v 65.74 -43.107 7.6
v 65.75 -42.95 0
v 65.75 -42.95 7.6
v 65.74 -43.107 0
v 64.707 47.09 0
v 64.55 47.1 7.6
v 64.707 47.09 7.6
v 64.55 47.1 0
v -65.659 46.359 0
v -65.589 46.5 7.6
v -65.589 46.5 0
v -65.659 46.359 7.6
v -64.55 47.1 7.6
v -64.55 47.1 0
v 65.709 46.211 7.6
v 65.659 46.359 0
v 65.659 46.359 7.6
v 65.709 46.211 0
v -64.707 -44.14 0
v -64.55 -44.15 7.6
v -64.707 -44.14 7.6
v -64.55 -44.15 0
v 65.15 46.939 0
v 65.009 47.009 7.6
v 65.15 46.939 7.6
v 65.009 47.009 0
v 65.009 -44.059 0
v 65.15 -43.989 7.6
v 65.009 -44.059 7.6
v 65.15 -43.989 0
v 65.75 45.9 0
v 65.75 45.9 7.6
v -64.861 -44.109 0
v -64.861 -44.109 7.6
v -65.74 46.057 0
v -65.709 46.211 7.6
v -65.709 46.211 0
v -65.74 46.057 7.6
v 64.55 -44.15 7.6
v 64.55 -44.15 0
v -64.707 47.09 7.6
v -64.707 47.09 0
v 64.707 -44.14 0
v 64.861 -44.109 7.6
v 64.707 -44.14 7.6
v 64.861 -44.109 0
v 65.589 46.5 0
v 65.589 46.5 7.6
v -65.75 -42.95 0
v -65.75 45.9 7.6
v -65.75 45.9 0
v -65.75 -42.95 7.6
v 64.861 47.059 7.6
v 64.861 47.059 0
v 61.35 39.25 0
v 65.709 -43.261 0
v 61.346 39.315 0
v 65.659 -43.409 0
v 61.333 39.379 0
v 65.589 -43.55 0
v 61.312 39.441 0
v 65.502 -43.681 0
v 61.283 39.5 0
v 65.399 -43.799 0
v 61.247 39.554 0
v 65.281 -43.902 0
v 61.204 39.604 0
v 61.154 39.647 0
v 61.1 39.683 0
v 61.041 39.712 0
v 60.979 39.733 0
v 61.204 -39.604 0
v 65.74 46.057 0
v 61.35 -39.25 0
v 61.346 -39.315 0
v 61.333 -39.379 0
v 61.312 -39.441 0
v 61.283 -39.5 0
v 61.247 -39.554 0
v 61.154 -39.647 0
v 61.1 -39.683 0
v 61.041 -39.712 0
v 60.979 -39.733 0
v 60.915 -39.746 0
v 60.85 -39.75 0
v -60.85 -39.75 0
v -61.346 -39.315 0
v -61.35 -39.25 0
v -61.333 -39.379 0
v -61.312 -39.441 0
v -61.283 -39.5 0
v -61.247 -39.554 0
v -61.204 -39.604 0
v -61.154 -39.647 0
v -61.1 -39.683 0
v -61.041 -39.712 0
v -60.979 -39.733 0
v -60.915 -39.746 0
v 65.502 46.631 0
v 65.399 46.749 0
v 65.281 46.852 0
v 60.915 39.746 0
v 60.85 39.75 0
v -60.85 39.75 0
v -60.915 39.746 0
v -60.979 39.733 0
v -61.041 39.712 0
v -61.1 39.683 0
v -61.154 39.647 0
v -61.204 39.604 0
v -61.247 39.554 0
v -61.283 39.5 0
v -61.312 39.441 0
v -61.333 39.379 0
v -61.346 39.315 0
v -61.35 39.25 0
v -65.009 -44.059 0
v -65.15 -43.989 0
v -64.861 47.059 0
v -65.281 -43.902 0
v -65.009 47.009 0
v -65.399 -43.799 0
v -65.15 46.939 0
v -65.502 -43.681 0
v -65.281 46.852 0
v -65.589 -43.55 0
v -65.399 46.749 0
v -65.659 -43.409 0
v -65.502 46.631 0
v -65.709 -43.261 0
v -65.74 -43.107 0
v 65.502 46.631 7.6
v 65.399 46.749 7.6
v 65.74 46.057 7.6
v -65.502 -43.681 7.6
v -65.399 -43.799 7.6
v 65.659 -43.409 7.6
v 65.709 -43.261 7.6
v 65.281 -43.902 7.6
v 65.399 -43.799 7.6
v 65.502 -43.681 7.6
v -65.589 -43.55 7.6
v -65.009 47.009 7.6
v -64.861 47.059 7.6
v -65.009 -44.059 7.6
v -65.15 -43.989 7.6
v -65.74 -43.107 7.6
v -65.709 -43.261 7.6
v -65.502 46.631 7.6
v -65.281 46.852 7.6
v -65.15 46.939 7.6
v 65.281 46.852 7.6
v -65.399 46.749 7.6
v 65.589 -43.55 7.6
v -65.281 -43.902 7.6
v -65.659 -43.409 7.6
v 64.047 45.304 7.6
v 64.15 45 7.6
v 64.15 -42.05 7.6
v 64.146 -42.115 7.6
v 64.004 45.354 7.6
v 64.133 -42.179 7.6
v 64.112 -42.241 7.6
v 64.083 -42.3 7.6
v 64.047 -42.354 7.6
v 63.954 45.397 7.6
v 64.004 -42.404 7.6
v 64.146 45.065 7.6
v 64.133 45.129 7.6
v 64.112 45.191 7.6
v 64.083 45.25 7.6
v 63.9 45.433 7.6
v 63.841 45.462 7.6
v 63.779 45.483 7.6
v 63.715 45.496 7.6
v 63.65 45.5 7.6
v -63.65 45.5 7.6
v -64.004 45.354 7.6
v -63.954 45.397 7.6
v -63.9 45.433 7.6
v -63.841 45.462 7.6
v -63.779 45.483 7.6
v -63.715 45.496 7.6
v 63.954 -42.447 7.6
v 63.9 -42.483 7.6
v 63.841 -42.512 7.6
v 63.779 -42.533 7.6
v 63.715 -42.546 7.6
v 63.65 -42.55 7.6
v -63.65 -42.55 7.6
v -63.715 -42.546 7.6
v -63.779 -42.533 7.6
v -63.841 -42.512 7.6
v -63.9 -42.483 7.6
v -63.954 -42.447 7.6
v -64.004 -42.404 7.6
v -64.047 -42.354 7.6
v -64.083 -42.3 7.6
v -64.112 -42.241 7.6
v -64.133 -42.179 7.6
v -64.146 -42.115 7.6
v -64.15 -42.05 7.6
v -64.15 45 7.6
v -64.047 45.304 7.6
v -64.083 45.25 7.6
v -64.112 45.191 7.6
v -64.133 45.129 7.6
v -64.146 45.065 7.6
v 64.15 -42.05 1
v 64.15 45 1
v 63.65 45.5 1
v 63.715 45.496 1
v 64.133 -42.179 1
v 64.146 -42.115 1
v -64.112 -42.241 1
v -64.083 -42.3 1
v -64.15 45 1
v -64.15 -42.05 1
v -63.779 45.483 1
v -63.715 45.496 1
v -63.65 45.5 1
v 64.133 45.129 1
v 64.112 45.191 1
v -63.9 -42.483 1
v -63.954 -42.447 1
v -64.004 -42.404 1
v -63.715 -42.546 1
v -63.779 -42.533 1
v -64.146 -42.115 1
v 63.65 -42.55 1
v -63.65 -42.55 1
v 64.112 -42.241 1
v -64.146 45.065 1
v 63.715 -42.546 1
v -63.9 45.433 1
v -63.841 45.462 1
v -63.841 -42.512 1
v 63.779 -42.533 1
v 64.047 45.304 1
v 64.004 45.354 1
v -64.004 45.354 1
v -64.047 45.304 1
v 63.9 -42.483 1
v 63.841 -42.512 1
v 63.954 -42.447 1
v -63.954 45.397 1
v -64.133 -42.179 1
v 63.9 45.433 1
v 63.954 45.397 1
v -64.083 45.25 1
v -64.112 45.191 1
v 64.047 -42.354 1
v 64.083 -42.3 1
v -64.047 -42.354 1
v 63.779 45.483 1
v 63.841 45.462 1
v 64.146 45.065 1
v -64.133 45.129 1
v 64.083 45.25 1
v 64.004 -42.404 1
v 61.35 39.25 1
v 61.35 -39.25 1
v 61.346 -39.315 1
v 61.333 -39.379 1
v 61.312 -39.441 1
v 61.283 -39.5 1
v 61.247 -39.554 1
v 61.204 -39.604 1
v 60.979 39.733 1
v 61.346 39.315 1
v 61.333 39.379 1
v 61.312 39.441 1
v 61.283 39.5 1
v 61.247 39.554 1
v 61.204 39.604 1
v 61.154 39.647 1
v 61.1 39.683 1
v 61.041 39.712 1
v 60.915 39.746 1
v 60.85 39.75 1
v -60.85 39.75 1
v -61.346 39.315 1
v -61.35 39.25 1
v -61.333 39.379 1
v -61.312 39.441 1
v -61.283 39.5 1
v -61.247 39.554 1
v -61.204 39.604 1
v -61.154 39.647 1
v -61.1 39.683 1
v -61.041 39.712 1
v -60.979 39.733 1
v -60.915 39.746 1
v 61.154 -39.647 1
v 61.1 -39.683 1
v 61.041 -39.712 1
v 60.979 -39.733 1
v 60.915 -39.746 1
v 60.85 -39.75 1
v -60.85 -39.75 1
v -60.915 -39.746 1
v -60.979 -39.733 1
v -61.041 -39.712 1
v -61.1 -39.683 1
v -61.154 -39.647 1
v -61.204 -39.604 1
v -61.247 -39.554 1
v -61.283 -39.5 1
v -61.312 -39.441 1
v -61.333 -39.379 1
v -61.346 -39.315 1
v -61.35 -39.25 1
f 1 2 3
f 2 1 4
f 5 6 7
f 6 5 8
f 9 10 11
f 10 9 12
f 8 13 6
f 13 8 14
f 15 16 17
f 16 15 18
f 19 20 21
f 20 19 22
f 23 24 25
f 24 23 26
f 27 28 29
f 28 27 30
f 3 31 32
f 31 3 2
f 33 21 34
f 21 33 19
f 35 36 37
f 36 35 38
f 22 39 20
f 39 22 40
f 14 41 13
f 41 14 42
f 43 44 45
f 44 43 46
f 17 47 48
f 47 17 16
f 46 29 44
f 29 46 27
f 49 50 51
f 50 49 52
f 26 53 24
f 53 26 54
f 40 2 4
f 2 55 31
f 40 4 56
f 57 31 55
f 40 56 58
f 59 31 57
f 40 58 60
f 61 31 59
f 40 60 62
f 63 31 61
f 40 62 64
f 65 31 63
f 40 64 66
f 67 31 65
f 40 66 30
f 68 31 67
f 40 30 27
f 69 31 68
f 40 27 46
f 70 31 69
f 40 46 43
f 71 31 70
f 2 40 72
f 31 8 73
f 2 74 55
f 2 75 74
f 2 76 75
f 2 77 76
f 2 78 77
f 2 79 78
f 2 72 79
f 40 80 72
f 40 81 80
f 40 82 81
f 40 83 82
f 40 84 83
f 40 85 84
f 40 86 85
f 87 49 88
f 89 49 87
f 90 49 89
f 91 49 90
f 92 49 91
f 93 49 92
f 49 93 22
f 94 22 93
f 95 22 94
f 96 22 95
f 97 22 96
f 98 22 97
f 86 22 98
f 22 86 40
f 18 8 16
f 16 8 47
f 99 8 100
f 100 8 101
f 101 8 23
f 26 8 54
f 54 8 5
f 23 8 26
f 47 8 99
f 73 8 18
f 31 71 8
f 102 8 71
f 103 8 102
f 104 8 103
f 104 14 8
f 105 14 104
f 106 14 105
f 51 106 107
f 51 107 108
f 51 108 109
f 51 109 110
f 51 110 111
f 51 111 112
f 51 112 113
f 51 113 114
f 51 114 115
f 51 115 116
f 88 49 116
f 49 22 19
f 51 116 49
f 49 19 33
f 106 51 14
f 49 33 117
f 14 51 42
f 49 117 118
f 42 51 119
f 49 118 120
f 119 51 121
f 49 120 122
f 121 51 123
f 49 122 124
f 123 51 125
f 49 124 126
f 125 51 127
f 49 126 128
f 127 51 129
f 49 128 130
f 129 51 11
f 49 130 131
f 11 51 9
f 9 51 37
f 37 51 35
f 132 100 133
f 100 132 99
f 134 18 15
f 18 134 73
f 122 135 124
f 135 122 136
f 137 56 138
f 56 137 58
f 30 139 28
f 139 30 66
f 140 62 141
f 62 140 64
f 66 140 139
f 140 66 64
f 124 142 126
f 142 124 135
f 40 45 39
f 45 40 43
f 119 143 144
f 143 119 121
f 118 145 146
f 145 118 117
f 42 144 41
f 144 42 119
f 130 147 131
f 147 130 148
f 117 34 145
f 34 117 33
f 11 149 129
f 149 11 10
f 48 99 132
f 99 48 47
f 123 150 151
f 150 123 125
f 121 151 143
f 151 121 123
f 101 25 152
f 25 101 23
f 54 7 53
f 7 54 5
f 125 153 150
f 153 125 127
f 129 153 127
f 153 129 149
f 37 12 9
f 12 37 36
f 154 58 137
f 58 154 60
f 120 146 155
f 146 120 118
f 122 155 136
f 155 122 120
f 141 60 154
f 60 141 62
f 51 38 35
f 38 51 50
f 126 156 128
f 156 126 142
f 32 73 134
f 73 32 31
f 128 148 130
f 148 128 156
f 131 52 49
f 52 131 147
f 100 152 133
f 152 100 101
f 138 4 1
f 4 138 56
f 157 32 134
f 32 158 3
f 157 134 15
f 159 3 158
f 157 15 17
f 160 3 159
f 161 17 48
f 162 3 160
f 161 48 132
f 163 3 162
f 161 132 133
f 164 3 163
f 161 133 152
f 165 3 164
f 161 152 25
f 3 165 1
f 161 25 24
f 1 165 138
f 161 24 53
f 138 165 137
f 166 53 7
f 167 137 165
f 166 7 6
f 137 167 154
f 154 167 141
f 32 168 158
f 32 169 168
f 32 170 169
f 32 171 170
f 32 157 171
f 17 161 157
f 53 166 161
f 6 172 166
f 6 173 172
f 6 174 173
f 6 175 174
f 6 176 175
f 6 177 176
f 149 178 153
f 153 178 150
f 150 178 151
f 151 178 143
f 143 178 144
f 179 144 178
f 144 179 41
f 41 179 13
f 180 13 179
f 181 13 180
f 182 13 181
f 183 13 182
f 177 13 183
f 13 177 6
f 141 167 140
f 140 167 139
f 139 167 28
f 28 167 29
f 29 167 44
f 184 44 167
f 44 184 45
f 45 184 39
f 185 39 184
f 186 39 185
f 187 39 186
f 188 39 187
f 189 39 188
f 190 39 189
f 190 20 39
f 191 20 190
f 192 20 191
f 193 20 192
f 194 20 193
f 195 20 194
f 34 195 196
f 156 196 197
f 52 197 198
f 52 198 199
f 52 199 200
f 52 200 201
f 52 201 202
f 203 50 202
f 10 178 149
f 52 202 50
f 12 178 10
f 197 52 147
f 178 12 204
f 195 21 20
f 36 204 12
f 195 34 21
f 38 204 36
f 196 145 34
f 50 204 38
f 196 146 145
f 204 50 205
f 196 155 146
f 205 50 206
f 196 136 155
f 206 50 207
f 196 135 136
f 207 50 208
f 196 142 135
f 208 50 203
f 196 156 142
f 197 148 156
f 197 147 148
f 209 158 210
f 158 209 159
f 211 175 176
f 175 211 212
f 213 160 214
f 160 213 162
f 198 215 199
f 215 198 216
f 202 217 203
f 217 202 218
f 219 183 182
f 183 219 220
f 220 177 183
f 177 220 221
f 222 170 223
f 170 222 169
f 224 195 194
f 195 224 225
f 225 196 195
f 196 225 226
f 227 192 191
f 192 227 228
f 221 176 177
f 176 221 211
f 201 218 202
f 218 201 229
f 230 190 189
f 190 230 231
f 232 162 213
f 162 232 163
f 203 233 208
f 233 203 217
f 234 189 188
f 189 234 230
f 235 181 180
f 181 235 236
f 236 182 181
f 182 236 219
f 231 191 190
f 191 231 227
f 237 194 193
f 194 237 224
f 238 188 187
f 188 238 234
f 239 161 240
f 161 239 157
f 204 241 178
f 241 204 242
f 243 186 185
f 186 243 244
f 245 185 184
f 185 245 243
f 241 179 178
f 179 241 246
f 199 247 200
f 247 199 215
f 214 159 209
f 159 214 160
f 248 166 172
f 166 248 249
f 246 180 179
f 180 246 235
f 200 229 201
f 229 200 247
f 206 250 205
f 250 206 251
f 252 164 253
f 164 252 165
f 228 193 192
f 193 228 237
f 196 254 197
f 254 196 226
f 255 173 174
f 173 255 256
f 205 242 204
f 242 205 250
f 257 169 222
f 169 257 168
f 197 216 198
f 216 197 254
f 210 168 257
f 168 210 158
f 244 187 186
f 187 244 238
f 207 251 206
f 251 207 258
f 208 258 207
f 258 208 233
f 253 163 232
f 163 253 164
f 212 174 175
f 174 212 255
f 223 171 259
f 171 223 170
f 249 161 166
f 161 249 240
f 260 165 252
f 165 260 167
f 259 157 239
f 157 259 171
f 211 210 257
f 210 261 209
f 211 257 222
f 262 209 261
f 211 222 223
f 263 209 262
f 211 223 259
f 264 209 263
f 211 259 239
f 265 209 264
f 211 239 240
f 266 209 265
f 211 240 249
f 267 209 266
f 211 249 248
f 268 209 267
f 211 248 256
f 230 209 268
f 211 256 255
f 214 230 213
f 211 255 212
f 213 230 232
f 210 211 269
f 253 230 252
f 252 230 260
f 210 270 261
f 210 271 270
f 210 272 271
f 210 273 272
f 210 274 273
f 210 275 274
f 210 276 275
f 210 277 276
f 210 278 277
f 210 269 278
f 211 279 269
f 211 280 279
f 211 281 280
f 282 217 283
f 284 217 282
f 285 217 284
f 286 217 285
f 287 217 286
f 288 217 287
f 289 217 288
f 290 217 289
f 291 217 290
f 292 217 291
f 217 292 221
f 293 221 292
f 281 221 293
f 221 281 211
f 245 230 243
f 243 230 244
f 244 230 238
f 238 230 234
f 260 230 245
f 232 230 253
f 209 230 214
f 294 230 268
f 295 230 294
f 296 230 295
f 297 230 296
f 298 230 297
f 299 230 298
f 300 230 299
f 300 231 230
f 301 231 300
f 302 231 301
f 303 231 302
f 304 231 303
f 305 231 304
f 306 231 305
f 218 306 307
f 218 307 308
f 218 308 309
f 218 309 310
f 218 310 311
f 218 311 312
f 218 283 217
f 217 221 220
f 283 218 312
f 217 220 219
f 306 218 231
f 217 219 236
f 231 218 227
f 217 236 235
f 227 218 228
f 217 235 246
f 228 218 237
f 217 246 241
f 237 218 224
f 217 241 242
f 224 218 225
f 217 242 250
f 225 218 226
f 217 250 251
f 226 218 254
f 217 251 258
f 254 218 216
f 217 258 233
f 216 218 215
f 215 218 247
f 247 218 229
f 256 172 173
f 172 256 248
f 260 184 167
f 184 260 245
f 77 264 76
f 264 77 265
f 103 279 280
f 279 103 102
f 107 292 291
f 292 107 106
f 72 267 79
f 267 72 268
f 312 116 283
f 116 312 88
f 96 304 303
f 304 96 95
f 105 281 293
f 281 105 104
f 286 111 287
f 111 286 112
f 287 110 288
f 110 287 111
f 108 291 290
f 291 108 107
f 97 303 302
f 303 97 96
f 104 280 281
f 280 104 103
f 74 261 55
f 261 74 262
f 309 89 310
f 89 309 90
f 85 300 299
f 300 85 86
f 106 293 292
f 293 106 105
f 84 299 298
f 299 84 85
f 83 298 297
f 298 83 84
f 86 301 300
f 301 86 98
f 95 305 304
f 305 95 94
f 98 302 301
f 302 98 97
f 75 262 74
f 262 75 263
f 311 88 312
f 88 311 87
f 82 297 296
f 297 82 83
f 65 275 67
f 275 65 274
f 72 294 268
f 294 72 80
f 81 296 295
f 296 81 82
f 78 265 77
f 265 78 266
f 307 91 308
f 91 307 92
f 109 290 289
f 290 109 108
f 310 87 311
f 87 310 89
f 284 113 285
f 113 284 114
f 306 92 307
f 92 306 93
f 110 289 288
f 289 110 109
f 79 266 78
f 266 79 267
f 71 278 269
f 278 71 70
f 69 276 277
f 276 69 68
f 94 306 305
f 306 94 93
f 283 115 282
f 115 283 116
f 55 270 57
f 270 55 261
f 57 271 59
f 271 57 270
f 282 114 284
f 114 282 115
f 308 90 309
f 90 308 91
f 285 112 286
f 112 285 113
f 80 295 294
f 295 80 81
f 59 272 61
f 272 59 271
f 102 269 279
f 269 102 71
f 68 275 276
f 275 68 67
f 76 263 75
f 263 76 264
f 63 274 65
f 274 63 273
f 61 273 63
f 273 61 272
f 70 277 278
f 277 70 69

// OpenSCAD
// ===========================================================================
// Display bezel for the screen actually fitted: Waveshare 50H-800480-IPS-CT
// ("5inch DSI Display, Thin & Light", touch glass 127.70 x 87.45 x 4.9). It is
// NOT the "5inch DSI LCD" the shell pocket was drawn for, so the screen is glued
// on the front face; this frame wraps the glass edge and laps over its black
// print so the screen looks built in.
//
// Glass outline, clear window and pixel area are read from Waveshare's own STEP
// (vendor/50h-800480-ips-ct/50h-800480-ips-ct.stp), origin at the window centre:
//   glass  x -63.85..63.85, y -45.20..42.25 (top face z 4.70)
//   window 109.0 x 65.8, pixels 108.0 x 64.8, both centred on the origin
//   black print: 9.35 on the sides and the top, 12.30 on the cable (bottom) edge
//
// part = "bezel" (default): print orientation, lip face down on the bed.
// part = "bezel_fitted": as it sits on the shell, z = 0 on the face.
// ===========================================================================
$fn = 48;

gl_x0 = -63.85; gl_x1 = 63.85;   // [OFFICIAL 3D] glass outline
gl_y0 = -45.20; gl_y1 = 42.25;   //   y0 is the cable edge (12.30 border), y1 the top (9.35 border)

glass_h = 6.45;  // [MEASURE] glass top above the shell face. 6.45 = glass top to the LCD
                 // back plate in the model, i.e. the LCD back resting on the face.
clr     = 0.30;  // [DESIGN] gap round the glass edge
wall    = 1.60;  // [DESIGN] side wall: clears the Y and D-pad holes beside the glass
lip_t   = 1.00;  // [DESIGN] lip thickness over the glass
lip     = 2.50;  // [DESIGN] lip over the black print on the sides and the top
lip_bot = lip + (12.30 - 9.35);  // wider on the cable edge: an even 6.85 of black shows all round
seat    = 0.15;  // [DESIGN] the lip clears the glass by this before the glue takes up
r_out   = 1.20;  // [DESIGN] outer corner radius

H = glass_h + seat + lip_t;      // face to the top of the lip

module rrect(x0, x1, y0, y1, r) {
  translate([x0 + r, y0 + r]) offset(r = r) square([x1 - x0 - 2*r, y1 - y0 - 2*r]);
}

module bezel_fitted() {
  difference() {
    linear_extrude(H)
      rrect(gl_x0 - clr - wall, gl_x1 + clr + wall, gl_y0 - clr - wall, gl_y1 + clr + wall, r_out);
    // the glass and everything under it
    translate([0, 0, -1]) linear_extrude(glass_h + seat + 1)
      rrect(gl_x0 - clr, gl_x1 + clr, gl_y0 - clr, gl_y1 + clr, 0.5);
    // the opening in the lip
    translate([0, 0, -1]) linear_extrude(H + 2)
      rrect(gl_x0 + lip, gl_x1 - lip, gl_y0 + lip_bot, gl_y1 - lip, 0.5);
  }
}

if (is_undef(part) || part == "bezel")
  translate([0, 0, H]) rotate([180, 0, 0]) bezel_fitted();      // lip face on the bed
else if (part == "bezel_fitted")
  bezel_fitted();
